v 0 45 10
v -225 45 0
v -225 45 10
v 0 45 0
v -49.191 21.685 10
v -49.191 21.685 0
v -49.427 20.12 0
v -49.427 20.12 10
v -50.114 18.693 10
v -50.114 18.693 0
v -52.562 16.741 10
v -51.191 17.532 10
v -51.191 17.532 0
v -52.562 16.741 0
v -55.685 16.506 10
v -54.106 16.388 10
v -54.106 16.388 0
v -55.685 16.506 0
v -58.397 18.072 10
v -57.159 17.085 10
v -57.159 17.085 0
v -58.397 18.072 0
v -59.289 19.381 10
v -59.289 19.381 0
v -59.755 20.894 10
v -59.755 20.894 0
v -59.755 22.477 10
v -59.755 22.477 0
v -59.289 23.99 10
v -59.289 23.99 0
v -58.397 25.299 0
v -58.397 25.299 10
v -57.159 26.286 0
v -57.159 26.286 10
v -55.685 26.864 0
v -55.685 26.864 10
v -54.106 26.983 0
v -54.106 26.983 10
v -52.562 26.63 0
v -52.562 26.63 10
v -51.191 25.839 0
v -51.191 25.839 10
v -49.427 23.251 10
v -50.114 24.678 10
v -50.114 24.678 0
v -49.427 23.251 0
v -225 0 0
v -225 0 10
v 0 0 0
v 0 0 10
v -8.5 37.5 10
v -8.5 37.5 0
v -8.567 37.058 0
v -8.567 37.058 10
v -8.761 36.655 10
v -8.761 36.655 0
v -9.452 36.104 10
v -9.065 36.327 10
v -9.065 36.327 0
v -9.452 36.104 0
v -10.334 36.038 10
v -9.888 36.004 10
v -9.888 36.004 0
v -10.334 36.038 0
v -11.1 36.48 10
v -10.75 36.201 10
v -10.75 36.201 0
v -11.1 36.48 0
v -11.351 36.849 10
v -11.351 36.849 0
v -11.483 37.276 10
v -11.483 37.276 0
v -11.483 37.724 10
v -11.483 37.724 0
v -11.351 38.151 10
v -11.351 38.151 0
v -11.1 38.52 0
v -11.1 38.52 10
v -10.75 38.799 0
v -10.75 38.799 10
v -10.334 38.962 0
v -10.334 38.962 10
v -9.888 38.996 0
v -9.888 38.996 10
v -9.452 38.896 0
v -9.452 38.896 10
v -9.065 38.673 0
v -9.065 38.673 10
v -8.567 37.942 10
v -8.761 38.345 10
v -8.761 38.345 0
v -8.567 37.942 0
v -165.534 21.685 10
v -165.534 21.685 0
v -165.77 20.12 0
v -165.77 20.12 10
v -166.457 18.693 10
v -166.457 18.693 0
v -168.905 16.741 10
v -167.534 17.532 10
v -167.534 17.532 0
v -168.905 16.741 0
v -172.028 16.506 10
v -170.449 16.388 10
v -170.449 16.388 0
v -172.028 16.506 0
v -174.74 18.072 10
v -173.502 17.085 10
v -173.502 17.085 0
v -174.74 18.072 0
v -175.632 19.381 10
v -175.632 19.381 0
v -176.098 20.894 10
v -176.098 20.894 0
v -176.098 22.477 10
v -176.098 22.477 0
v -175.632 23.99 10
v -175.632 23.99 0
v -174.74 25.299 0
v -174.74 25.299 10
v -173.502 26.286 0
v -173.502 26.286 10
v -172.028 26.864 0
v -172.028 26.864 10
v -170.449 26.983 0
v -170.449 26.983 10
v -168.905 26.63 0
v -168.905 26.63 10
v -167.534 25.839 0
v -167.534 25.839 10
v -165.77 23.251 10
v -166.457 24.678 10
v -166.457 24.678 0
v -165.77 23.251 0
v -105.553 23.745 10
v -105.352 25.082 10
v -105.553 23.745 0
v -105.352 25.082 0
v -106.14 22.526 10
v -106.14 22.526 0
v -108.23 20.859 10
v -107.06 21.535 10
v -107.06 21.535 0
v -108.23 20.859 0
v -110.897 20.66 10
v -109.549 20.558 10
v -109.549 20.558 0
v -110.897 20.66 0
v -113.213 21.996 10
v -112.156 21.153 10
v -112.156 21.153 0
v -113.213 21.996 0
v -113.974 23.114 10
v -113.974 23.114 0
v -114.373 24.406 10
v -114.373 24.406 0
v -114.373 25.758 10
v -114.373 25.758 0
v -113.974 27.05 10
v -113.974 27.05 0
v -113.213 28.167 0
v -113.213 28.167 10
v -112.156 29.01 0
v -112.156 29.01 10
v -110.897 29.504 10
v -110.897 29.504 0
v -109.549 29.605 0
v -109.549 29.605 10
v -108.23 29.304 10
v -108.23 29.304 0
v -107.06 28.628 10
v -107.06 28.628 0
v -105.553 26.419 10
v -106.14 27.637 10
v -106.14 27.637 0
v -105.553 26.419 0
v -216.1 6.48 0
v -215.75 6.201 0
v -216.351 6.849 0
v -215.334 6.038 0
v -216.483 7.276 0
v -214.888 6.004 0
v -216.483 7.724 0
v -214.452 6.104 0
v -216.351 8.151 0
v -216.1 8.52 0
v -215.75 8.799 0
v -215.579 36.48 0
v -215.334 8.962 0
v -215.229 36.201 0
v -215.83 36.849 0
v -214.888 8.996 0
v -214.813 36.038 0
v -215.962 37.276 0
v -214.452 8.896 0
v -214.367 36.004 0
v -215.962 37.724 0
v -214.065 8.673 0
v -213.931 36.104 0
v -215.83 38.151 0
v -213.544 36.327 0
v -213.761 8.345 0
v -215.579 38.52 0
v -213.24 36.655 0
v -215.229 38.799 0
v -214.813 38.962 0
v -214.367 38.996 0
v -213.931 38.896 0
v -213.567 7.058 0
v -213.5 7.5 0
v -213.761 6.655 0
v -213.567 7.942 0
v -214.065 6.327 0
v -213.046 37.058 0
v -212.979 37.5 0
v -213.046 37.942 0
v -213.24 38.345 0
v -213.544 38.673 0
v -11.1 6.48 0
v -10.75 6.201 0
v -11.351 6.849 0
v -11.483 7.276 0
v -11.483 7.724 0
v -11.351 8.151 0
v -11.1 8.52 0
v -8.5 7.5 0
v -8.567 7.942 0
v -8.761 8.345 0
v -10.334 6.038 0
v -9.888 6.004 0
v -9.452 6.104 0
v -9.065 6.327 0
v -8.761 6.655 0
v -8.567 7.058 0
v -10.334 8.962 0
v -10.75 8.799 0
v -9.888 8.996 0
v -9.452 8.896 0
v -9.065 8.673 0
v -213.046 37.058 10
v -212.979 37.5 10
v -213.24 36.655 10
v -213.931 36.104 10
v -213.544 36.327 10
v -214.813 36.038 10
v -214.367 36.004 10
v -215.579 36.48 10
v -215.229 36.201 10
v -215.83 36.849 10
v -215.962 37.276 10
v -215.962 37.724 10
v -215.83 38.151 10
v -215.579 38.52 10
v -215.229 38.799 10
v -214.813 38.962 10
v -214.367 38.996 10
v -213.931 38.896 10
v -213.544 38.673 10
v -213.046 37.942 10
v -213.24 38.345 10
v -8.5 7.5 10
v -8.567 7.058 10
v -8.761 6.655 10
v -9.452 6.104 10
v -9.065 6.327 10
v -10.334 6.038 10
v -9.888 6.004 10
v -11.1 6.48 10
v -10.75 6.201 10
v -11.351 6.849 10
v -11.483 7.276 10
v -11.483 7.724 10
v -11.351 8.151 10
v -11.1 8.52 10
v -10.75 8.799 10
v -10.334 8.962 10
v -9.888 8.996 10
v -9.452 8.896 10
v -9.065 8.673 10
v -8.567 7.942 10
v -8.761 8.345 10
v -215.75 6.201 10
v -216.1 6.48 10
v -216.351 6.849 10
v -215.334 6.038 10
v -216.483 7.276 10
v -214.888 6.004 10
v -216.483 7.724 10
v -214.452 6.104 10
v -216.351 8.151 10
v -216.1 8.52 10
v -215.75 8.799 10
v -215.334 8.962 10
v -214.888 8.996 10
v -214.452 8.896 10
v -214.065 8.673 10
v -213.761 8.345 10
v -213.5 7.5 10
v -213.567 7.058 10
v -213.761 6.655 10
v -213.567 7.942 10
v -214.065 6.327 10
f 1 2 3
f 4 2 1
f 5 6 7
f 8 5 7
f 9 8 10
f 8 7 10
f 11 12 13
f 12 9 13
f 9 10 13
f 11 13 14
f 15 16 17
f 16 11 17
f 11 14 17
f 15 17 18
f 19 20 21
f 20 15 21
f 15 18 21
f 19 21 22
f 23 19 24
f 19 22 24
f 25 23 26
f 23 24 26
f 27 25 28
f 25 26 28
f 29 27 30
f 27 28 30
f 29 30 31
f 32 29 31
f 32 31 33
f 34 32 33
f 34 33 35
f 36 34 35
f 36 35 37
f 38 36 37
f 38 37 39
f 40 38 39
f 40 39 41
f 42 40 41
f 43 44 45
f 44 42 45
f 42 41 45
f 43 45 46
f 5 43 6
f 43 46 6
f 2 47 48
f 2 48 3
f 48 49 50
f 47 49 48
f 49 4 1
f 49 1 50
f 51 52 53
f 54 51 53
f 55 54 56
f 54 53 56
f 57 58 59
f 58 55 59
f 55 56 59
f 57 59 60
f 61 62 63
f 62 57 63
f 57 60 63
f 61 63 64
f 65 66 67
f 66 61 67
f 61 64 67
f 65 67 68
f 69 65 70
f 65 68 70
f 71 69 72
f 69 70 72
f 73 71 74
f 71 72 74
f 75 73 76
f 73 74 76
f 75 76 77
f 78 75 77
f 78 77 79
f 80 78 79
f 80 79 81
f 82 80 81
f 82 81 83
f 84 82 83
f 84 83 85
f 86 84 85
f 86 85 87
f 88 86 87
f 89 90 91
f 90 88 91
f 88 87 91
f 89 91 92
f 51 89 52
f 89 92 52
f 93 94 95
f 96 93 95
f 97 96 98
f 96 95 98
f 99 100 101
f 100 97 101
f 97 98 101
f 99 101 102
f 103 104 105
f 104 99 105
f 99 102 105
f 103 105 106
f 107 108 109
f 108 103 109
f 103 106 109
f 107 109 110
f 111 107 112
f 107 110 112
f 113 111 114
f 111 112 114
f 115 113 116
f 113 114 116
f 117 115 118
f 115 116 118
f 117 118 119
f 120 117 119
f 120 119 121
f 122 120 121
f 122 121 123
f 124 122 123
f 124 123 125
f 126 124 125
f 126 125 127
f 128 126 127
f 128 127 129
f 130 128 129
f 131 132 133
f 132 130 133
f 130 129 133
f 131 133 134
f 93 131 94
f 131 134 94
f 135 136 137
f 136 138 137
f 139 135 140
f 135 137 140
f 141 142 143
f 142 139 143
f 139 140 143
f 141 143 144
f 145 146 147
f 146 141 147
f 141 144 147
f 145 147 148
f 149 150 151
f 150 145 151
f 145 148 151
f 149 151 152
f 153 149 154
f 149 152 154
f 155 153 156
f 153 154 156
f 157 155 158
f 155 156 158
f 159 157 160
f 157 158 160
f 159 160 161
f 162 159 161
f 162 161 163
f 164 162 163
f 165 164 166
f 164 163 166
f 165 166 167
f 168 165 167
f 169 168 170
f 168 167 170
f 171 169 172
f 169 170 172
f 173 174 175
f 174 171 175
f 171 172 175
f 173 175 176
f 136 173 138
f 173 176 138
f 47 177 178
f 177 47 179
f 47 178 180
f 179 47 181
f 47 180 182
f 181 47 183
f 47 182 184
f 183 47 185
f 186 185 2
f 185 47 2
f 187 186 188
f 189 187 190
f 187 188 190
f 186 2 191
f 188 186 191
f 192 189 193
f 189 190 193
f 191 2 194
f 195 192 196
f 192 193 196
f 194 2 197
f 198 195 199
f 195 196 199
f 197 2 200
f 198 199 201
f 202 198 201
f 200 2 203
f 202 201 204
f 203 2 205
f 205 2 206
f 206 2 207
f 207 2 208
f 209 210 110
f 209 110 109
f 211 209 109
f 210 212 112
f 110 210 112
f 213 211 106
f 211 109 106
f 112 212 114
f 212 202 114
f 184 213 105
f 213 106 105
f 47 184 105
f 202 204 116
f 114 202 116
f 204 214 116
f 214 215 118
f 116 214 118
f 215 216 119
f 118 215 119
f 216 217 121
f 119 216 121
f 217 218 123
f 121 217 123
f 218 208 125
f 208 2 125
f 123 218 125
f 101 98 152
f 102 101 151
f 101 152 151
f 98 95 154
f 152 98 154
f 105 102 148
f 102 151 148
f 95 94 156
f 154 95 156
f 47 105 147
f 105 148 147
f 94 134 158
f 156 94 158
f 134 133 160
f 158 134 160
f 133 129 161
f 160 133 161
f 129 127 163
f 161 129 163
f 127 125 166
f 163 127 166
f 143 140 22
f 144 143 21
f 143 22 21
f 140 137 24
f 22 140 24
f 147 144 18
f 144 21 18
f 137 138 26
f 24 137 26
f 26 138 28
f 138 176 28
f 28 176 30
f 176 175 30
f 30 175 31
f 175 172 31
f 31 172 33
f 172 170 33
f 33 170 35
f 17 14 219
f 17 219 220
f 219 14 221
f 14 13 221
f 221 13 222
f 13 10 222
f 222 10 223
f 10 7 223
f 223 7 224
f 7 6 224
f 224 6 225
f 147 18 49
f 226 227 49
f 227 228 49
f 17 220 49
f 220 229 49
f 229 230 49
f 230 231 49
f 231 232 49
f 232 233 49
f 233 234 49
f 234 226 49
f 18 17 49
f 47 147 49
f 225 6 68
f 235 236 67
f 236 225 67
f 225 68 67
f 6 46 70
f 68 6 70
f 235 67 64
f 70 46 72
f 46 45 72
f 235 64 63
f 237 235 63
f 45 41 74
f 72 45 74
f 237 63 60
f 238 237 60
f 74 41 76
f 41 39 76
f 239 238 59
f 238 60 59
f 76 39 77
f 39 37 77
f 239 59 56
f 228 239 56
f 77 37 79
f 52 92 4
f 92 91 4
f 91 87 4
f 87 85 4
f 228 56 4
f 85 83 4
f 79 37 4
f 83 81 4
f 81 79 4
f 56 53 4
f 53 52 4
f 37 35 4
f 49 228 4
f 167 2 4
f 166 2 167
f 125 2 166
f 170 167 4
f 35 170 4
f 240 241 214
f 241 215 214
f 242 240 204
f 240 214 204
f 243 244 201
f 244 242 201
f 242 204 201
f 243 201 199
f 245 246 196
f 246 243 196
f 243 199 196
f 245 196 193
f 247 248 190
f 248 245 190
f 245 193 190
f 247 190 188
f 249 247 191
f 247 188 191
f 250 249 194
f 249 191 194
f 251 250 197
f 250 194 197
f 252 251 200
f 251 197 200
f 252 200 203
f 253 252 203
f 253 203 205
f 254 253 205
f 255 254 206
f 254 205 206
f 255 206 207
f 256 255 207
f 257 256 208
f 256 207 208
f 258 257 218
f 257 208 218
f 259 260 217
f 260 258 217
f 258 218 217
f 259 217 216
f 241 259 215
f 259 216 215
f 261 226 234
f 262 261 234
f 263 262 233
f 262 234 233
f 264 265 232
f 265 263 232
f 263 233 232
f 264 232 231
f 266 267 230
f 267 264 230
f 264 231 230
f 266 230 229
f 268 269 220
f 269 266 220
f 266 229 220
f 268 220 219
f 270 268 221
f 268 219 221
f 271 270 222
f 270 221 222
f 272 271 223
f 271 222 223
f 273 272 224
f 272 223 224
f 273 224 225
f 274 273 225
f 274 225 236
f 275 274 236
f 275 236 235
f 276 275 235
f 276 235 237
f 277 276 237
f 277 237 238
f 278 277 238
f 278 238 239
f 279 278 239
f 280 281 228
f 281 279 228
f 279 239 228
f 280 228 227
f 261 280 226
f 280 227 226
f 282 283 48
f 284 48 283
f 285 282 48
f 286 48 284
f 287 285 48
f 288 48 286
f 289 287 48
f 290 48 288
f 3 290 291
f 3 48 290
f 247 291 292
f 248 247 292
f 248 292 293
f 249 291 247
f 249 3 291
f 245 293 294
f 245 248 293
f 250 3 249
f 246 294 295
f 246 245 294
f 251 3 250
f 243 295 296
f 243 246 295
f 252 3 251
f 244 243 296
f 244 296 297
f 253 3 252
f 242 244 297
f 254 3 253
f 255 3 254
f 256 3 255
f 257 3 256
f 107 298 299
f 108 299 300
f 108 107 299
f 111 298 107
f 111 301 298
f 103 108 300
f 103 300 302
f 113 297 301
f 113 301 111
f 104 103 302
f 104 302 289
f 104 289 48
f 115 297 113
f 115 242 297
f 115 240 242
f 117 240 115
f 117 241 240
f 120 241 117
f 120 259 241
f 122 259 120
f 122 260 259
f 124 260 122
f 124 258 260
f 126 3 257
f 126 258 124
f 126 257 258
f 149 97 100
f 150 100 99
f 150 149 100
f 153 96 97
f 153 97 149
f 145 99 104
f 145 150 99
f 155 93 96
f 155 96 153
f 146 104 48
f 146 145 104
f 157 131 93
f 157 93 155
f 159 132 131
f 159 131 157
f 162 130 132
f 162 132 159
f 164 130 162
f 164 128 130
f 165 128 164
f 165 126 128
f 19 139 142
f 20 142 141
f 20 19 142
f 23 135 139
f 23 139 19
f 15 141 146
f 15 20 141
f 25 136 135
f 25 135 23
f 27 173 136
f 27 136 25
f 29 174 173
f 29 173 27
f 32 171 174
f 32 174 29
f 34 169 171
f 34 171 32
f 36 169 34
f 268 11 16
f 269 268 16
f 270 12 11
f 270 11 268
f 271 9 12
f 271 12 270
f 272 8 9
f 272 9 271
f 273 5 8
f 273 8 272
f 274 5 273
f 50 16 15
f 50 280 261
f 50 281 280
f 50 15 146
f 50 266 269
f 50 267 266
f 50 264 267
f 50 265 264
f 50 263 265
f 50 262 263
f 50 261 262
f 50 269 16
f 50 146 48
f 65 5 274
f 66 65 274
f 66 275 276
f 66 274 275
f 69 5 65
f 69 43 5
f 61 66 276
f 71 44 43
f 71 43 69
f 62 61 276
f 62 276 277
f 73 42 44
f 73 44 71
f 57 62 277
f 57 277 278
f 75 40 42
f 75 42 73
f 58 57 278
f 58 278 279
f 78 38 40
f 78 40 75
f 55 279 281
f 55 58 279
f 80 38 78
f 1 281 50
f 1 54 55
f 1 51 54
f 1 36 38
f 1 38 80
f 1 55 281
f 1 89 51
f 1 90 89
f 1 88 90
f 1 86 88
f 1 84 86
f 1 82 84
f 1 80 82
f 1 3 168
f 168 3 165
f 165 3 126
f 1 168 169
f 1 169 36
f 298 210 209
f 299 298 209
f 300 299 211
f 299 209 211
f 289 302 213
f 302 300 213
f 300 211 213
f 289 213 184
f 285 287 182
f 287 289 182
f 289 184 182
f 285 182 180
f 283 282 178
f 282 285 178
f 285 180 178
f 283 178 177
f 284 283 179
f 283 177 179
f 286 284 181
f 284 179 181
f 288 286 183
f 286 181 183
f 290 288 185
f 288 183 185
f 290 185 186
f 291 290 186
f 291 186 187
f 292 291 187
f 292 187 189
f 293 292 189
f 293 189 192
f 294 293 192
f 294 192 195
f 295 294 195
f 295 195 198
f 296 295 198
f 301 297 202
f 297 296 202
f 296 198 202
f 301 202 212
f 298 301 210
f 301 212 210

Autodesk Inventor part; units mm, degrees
ref_plane "YZ Plane" through (0, 0, 0) normal (1, 0, 0) x (0, 1, 0)
ref_plane "XZ Plane" through (0, 0, 0) normal (0, 1, 0) x (-1, 0, 0)
ref_plane "XY Plane" through (0, 0, 0) normal (0, 0, 1) x (1, 0, 0)
sketch "Sketch1" plane through (0, 0, 0) normal (0, 0, 1) x (1, 0, 0)
  line L0 (0, 0) -> (-225, 0)
  line L1 (-225, 0) -> (-225, 45)
  line L2 (-225, 45) -> (0, 45)
  line L3 (0, 45) -> (0, 0)
  circle A0 centre (-10, 37.5) radius 1.5
  circle A1 centre (-10, 7.5) radius 1.5
  circle A2 centre (-214.479, 37.5) radius 1.5
  circle A3 centre (-215, 7.5) radius 1.5
  circle A4 centre (-109.8876, 25.0816) radius 4.5358
  circle A5 centre (-170.8457, 21.6854) radius 5.3121
  circle A6 centre (-54.5027, 21.6854) radius 5.3121
  dimension "d0" = 45
  dimension "d1" = 225
  dimension "d2" = 30
  dimension "d3" = 3
  dimension "d4" = 3
  dimension "d5" = 7.5
  dimension "d6" = 7.5
  dimension "d7" = 3
  dimension "d8" = 3
  dimension "d9" = 30
  dimension "d10" = 10
  dimension "d11" = 10
extrude "Extrusion1" add sketch "Sketch1" along normal blind 10
equation "\"d6\" = d5"
equation "\"d7\" = d4"
equation "\"d8\" = d7"
equation "\"d9\" = d2"
properties part number "PlateHeatbed"
